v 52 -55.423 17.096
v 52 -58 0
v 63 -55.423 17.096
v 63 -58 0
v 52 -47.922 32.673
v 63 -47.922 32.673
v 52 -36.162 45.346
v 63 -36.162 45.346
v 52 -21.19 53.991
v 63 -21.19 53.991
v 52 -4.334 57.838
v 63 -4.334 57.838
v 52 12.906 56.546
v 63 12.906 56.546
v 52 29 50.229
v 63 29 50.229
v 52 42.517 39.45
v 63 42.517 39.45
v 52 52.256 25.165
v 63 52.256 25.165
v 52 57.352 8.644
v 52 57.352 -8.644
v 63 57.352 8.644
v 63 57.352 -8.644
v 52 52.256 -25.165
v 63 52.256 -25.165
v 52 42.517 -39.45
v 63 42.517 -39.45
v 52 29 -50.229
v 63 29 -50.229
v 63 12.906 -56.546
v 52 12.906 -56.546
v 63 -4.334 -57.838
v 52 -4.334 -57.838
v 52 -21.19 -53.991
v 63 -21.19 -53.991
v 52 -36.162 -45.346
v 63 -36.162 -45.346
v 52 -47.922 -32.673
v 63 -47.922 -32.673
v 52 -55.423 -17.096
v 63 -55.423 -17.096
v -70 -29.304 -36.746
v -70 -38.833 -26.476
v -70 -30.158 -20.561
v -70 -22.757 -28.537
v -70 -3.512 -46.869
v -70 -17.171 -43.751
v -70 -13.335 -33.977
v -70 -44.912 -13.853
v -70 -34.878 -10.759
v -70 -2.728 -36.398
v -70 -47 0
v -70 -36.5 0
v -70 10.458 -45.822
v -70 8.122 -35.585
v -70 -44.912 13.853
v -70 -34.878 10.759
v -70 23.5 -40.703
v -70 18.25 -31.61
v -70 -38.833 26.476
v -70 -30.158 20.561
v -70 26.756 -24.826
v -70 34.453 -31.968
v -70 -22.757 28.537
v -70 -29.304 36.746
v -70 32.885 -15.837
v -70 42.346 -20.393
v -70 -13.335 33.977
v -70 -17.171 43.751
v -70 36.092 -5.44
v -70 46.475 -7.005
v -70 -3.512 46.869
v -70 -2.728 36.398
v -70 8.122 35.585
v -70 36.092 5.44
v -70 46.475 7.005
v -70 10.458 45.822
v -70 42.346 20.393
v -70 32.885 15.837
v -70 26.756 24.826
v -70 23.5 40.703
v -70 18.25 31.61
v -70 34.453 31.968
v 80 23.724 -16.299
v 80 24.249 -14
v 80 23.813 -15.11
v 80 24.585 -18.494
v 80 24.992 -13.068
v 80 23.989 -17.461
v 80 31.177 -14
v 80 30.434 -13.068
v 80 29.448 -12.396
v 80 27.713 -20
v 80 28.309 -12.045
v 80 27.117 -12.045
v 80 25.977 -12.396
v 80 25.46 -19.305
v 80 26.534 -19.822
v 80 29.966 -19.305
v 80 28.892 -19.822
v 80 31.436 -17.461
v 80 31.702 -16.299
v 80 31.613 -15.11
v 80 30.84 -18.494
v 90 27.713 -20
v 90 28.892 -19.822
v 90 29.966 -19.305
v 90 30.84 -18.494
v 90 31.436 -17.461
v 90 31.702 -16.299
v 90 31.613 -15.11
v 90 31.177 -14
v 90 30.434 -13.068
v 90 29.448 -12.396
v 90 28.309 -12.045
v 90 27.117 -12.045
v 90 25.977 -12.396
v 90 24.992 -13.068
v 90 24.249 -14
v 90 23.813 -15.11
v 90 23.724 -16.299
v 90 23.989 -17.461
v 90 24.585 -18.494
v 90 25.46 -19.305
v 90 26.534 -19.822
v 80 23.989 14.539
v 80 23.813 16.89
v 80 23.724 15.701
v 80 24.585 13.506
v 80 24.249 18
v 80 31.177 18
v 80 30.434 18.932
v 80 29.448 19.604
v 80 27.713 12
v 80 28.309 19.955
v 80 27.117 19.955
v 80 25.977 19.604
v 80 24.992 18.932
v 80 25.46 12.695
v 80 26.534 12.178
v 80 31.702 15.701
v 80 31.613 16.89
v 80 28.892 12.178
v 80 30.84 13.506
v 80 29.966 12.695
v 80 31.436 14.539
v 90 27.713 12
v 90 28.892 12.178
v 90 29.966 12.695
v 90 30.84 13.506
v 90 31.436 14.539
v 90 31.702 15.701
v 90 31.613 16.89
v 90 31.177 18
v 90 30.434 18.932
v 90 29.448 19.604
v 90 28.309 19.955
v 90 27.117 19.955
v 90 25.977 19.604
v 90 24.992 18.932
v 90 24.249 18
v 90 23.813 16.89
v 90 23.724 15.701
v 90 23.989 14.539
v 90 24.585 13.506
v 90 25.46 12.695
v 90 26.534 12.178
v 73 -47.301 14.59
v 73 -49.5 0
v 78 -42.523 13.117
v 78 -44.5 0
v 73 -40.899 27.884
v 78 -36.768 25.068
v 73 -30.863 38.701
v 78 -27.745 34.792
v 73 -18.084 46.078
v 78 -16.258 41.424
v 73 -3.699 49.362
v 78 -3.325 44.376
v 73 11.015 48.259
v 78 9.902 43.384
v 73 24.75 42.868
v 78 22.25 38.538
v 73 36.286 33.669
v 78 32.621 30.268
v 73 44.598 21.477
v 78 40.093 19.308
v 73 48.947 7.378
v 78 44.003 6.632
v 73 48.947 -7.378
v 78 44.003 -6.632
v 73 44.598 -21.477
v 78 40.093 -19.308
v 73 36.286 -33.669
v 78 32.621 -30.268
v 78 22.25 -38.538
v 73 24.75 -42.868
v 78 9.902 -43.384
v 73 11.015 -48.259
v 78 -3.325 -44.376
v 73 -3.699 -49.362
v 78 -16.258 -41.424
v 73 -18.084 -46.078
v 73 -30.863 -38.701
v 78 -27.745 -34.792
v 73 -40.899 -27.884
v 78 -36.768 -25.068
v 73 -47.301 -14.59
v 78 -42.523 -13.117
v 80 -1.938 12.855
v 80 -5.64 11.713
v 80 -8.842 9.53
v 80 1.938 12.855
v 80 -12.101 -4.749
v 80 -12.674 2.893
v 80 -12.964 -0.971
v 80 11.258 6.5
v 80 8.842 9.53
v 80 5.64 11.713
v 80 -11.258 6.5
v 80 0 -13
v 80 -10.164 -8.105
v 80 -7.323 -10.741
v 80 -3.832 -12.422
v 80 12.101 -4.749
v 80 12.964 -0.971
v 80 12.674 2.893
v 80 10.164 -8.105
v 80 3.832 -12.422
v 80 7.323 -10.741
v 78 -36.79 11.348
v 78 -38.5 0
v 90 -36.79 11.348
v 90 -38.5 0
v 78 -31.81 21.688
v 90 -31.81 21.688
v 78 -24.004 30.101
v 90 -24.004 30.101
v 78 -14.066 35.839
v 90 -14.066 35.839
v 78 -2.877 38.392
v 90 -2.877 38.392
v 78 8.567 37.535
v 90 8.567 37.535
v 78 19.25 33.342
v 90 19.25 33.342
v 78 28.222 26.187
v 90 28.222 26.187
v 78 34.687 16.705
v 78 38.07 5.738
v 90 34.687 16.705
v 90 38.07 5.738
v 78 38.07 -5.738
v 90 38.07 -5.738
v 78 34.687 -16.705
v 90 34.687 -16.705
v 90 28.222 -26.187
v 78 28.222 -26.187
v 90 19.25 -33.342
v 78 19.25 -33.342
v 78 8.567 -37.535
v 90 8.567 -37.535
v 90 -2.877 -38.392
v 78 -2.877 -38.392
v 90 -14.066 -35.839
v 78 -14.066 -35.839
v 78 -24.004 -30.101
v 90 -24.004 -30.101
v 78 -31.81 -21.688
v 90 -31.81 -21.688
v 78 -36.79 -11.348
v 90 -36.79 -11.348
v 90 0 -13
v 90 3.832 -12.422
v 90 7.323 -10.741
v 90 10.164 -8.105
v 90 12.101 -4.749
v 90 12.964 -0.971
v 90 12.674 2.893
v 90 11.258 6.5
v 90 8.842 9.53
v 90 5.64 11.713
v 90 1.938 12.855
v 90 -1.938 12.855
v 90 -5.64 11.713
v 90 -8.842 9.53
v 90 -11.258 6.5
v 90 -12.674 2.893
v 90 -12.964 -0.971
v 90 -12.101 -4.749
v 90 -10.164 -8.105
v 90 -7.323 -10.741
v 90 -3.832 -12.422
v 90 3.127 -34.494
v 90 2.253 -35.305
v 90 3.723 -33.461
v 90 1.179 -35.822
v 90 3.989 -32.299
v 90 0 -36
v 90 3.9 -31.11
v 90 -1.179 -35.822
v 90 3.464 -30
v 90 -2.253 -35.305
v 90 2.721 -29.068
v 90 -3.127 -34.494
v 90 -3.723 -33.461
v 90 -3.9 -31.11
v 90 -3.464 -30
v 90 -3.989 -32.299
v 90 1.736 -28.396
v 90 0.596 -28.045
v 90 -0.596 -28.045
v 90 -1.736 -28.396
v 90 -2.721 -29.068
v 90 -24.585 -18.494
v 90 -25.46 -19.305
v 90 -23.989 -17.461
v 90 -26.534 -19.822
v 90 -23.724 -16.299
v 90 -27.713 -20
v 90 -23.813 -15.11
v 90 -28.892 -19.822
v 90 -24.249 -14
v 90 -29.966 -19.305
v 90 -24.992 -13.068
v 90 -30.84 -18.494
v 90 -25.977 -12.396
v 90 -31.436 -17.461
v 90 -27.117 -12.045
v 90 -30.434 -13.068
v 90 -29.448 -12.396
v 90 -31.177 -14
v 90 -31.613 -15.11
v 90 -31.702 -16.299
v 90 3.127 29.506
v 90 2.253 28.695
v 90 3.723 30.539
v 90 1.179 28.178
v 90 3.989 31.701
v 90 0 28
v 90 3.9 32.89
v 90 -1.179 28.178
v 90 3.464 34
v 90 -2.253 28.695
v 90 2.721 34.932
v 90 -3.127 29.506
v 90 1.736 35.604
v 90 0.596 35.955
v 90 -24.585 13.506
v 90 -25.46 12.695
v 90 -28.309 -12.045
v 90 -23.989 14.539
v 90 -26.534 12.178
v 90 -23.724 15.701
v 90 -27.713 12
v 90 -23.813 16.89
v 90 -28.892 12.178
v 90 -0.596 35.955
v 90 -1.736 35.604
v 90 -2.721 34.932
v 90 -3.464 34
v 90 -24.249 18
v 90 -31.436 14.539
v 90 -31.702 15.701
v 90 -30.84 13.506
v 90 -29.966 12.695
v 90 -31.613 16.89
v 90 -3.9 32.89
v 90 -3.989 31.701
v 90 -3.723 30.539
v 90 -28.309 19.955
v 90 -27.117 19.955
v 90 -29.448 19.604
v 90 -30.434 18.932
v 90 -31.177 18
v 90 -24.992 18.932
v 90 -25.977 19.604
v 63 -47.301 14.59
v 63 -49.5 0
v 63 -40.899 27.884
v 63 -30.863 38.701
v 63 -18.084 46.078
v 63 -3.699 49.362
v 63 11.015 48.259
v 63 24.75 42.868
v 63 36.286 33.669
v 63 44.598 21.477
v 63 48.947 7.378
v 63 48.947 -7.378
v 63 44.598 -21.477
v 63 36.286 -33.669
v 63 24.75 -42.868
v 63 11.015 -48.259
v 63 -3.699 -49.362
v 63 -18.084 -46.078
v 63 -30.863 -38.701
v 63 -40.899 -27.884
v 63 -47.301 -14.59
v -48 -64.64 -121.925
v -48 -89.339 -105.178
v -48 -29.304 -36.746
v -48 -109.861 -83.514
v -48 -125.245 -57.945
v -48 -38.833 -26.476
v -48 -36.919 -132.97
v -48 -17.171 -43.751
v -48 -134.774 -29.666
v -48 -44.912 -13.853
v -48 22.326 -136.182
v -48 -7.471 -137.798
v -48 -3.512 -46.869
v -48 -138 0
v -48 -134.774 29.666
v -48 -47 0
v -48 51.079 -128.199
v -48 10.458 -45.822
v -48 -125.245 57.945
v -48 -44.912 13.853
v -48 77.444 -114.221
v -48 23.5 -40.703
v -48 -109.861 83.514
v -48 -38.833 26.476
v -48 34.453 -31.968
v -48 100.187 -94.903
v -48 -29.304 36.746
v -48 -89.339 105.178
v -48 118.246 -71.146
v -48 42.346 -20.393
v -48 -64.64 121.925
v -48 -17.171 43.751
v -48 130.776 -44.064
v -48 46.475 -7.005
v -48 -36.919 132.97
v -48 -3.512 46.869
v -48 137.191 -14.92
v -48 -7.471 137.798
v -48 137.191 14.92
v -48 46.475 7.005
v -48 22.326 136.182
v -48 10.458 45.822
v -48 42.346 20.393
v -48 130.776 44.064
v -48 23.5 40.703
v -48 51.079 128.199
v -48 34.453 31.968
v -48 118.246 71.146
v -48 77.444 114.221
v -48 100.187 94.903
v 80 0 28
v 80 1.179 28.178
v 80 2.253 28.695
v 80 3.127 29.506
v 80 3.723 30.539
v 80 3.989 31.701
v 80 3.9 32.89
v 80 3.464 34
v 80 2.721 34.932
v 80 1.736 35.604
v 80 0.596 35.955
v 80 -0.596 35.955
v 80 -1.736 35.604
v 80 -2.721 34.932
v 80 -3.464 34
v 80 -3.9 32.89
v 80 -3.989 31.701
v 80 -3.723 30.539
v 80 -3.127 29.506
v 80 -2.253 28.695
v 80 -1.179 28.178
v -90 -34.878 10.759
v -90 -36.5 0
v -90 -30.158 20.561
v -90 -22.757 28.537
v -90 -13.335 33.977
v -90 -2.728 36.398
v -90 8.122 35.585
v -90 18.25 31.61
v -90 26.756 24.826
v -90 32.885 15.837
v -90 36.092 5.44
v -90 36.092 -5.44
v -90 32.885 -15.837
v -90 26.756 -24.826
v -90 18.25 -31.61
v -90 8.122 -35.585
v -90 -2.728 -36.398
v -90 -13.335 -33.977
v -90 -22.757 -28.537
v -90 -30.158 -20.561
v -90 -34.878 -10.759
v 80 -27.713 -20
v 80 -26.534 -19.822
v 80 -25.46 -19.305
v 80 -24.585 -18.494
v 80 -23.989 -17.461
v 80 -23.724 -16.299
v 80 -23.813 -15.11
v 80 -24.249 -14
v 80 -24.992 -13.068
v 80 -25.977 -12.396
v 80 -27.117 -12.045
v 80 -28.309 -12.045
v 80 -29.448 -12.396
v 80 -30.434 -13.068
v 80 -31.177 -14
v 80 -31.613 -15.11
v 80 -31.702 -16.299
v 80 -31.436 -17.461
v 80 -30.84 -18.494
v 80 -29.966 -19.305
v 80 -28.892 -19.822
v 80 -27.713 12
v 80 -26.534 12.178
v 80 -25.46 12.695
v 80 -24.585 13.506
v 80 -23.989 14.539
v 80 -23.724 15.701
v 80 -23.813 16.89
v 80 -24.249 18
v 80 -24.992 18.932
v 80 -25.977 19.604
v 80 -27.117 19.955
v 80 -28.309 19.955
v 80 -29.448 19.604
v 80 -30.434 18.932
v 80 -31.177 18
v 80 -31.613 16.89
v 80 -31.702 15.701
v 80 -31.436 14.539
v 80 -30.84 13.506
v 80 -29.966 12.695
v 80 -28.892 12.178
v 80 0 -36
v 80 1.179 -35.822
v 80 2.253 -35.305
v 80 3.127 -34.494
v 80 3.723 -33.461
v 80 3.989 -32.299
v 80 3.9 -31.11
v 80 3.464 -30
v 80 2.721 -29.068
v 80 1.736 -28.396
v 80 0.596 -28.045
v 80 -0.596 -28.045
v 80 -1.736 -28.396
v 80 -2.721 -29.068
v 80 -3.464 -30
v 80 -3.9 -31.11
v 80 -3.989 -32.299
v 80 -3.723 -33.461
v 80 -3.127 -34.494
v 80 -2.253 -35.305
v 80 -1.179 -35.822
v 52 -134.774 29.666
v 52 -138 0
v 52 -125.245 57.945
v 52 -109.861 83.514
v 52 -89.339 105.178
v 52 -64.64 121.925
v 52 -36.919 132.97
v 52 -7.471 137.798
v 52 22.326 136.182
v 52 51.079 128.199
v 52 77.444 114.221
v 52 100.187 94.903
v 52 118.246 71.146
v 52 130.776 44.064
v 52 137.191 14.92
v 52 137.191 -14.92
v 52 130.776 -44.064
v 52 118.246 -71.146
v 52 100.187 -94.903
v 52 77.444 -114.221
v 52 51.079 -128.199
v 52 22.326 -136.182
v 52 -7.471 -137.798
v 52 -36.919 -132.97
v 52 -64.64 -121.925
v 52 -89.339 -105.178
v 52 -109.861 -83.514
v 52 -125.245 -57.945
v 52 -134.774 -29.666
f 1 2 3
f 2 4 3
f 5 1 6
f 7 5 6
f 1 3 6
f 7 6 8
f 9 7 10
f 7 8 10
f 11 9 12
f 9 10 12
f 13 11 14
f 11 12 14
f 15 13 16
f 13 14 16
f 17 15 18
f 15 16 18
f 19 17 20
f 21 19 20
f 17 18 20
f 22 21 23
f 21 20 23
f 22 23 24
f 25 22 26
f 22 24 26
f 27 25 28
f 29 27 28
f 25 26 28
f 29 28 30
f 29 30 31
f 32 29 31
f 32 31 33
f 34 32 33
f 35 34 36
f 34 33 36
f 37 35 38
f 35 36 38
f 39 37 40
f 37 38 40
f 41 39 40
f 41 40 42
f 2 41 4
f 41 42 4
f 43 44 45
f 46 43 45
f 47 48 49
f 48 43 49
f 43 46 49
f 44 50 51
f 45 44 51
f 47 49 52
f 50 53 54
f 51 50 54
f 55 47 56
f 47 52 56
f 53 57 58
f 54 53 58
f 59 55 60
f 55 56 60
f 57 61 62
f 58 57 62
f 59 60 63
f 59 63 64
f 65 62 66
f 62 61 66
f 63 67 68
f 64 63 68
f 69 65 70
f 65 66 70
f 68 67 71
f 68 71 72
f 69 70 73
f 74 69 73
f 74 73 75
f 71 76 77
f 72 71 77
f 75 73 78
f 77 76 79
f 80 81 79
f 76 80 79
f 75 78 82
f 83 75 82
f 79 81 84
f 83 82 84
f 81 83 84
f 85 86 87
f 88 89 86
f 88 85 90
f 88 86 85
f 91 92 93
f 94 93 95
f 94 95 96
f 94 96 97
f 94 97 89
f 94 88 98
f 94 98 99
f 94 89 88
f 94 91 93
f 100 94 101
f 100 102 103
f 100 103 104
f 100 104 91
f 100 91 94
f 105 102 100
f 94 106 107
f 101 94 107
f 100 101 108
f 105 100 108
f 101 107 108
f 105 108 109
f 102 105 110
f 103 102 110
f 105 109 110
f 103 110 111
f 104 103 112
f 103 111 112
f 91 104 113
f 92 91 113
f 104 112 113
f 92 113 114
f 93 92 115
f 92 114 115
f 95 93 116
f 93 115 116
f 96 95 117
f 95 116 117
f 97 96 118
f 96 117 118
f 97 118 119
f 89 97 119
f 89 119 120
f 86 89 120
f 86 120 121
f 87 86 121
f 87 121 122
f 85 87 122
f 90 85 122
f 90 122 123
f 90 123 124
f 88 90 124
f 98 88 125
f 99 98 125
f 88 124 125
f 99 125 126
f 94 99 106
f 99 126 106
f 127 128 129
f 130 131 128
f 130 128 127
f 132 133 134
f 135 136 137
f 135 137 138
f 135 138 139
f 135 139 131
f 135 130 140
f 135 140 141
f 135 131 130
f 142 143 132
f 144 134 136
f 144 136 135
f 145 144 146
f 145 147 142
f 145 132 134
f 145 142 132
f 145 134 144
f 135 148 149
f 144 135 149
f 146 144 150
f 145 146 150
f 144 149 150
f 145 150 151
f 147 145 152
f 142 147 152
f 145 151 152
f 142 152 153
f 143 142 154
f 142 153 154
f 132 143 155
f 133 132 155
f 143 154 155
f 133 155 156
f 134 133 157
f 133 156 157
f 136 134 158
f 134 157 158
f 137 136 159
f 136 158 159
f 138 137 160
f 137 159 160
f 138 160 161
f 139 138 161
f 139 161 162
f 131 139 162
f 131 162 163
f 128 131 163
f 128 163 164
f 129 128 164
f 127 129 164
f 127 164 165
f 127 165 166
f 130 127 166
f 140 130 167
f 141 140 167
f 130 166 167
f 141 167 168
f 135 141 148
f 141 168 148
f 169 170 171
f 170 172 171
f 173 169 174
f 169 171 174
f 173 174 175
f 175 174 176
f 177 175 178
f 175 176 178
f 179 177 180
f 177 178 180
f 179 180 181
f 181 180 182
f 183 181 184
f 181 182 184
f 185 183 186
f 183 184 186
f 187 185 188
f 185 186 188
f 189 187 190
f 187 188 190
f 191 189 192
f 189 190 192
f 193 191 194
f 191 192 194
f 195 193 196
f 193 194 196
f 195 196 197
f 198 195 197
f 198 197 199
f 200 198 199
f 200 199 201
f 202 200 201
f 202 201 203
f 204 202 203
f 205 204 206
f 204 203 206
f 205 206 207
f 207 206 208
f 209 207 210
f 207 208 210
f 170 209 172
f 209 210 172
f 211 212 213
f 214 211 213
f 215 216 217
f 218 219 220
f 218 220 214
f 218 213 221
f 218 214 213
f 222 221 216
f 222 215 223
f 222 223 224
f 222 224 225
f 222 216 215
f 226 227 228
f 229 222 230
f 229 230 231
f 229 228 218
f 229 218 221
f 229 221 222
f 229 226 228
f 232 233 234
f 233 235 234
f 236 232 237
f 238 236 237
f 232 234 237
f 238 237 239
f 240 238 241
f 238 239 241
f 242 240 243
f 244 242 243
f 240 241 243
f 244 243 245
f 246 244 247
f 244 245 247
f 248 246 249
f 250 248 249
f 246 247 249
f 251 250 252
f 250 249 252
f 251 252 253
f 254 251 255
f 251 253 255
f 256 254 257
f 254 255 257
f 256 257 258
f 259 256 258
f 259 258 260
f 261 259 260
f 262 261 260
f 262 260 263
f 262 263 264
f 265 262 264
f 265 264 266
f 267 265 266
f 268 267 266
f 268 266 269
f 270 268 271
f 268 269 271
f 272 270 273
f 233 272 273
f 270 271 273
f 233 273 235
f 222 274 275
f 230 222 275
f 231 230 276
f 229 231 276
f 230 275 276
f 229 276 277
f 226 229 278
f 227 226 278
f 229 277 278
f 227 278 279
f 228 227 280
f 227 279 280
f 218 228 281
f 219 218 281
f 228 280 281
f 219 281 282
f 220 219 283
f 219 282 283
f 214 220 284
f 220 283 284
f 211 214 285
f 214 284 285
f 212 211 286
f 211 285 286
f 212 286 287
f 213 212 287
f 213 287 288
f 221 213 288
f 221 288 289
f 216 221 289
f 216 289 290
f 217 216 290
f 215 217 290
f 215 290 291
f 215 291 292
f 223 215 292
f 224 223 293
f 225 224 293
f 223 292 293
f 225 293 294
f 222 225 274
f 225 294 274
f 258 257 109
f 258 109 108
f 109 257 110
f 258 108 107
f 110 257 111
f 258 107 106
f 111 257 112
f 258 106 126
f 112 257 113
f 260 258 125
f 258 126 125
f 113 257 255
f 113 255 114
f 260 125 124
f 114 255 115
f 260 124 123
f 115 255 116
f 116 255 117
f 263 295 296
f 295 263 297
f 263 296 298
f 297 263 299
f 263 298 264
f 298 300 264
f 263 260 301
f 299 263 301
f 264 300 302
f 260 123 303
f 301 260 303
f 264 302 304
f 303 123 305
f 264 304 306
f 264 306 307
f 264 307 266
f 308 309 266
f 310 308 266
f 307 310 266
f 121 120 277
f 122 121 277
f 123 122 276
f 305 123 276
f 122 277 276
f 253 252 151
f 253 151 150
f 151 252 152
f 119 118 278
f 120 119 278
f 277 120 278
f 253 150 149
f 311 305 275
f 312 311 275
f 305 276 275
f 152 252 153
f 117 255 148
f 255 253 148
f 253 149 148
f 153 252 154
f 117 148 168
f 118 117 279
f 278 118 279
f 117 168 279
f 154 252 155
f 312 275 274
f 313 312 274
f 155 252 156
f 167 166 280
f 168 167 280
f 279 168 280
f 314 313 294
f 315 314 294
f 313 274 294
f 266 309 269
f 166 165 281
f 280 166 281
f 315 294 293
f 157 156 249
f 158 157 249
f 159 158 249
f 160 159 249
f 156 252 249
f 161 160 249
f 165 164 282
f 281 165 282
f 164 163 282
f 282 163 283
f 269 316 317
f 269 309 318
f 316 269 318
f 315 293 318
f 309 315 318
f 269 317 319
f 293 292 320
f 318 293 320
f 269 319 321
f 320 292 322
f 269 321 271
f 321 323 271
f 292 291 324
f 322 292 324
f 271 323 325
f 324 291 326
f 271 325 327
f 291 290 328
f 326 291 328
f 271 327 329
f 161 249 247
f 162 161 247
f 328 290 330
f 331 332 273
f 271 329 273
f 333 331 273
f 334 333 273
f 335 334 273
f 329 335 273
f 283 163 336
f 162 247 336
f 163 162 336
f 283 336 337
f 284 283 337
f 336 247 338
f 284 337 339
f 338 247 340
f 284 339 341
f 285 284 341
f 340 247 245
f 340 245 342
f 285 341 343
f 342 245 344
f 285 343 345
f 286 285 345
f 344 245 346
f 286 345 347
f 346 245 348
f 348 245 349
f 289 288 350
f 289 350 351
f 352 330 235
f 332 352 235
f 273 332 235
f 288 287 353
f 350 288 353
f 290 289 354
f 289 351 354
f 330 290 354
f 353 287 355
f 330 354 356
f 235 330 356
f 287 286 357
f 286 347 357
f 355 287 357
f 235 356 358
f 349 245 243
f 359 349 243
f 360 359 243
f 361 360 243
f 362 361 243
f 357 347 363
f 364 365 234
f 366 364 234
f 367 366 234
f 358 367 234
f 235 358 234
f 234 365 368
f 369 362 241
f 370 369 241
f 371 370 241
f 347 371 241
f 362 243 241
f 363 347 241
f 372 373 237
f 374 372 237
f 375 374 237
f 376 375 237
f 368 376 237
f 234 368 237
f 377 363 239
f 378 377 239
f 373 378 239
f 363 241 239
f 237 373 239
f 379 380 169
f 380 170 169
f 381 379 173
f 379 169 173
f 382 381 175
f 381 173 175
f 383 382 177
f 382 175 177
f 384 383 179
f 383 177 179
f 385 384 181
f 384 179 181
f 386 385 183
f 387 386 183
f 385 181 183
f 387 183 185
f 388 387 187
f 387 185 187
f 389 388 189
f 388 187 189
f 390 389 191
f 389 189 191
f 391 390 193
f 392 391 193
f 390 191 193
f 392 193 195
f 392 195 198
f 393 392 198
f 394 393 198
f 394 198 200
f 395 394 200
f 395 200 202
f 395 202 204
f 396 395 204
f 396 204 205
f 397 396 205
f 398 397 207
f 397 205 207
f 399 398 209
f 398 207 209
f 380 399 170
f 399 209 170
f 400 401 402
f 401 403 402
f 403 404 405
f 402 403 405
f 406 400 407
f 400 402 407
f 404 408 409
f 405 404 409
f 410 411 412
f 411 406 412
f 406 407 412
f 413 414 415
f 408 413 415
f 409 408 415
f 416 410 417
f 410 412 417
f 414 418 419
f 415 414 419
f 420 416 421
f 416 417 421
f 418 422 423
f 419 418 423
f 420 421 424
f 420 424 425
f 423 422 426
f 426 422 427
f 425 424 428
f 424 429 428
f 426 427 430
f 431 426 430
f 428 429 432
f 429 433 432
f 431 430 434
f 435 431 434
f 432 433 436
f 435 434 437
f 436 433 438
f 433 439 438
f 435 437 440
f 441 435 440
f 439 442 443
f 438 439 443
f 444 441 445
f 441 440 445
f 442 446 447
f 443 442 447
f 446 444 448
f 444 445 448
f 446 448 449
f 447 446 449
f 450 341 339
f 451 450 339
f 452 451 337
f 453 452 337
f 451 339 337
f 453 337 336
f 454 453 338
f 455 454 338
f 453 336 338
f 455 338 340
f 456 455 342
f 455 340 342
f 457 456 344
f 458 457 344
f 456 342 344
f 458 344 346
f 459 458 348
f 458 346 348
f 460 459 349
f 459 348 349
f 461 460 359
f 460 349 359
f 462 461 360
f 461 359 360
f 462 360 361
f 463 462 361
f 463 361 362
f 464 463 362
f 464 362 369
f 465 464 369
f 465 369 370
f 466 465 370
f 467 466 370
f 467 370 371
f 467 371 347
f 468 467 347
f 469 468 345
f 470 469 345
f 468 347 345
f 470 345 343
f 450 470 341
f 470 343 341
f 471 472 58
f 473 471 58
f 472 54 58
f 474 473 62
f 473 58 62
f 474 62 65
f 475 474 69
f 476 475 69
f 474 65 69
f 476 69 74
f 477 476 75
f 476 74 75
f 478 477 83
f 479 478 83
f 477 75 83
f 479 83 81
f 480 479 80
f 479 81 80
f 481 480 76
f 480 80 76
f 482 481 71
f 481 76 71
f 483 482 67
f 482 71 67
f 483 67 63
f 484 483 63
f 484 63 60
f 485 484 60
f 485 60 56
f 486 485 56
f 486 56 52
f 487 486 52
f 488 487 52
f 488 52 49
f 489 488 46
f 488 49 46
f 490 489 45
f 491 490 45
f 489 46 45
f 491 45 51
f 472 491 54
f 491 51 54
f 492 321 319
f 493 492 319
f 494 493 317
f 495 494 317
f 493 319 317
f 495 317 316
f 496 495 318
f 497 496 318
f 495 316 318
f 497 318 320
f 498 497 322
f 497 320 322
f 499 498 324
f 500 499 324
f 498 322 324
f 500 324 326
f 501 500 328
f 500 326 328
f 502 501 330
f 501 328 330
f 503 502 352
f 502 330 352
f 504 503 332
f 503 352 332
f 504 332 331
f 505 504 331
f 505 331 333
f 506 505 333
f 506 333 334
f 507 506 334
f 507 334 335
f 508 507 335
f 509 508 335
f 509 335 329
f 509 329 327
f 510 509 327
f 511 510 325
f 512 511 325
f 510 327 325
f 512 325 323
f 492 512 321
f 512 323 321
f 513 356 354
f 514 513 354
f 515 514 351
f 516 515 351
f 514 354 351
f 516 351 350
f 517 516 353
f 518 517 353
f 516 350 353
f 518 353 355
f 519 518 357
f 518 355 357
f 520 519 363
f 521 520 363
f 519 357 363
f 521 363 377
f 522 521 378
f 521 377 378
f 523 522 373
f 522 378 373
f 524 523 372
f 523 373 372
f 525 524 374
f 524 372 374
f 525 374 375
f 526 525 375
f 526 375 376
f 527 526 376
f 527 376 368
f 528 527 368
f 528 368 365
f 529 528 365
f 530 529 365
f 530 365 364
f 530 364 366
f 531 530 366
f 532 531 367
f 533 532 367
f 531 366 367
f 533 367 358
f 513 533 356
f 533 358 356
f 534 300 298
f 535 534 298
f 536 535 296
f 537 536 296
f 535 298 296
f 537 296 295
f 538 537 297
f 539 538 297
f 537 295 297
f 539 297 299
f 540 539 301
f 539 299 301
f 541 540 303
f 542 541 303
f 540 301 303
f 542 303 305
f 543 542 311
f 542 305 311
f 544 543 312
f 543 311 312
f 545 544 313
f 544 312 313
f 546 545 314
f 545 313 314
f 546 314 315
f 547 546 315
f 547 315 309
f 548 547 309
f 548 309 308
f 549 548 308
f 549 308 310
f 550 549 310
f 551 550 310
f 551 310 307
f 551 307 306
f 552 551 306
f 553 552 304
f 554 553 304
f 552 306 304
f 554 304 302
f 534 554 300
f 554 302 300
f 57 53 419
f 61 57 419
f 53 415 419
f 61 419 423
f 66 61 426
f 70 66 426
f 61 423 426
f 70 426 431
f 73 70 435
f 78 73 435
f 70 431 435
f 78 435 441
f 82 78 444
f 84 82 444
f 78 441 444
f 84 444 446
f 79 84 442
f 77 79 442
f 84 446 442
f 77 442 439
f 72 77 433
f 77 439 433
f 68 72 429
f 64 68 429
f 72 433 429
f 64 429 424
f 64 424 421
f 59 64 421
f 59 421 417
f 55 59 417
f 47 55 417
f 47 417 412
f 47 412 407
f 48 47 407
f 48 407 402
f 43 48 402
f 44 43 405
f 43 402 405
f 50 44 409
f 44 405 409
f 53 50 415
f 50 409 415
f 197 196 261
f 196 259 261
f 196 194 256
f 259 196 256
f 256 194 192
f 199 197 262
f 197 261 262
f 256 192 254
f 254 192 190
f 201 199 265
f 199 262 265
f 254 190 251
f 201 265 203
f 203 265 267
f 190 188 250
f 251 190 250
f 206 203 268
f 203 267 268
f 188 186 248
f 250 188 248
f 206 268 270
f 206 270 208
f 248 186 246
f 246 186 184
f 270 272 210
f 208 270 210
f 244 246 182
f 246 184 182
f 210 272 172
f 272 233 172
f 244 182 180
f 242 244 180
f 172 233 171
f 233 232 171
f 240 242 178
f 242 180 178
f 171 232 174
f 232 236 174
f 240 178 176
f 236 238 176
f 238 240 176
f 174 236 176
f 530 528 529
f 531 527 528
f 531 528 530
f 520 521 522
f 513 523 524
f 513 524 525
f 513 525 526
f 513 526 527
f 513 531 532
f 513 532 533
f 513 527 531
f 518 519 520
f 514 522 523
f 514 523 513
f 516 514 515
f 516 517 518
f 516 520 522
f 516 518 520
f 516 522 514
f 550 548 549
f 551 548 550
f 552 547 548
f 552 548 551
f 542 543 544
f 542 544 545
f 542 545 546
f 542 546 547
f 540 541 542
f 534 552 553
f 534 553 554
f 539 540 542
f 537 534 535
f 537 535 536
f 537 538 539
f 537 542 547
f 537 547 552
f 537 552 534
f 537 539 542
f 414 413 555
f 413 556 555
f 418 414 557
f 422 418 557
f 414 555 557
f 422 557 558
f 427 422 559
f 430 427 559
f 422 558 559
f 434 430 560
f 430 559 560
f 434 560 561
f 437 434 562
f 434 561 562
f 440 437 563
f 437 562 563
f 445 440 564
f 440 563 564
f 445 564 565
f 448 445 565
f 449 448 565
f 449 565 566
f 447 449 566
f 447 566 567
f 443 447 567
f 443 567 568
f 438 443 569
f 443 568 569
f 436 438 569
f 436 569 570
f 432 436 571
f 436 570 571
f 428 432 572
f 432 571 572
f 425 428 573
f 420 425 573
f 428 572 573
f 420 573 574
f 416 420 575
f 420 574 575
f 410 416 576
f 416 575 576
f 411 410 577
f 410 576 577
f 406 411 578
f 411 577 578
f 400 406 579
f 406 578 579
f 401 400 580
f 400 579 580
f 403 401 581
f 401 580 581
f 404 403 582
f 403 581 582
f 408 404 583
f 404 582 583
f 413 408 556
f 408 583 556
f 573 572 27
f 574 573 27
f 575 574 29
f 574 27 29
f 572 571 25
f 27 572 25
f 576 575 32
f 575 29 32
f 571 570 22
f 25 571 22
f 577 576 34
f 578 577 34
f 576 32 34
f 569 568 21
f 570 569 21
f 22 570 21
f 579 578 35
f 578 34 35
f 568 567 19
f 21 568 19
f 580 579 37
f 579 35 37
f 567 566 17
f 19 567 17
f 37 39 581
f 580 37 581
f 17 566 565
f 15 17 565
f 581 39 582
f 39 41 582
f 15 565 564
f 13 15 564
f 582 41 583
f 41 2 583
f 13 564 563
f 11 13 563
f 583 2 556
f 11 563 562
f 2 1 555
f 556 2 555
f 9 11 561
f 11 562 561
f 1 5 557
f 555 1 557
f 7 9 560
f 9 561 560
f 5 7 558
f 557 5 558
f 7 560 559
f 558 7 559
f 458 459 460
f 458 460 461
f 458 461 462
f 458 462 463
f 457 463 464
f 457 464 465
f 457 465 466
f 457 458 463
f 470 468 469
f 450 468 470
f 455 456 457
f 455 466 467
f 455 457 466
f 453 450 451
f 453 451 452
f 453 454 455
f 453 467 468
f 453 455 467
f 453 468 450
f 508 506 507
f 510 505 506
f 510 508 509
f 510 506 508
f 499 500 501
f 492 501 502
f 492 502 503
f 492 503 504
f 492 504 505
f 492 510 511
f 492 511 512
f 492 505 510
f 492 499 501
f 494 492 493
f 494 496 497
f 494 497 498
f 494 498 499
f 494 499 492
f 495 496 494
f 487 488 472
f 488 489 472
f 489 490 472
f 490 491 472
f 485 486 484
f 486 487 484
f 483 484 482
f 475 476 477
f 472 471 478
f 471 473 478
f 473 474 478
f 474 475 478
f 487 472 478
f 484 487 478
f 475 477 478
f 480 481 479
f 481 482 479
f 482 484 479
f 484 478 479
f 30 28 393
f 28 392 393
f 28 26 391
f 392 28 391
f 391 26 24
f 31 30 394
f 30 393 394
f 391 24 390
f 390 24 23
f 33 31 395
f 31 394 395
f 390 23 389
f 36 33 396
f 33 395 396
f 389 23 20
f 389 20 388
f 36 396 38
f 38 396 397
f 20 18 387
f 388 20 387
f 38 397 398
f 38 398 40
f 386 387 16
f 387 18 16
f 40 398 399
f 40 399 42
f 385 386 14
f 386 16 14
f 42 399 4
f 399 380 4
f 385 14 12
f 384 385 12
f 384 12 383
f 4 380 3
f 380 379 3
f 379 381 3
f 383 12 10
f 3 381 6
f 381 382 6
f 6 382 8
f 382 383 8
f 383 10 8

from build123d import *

# Parameters (mm, degrees)
SZKIC4_R                   = 4
WYTNIJ_WYCI_GNI_CIE1_DEPTH = 10
SZKIC5_R                   = 13
WYTNIJ_WYCI_GNI_CIE2_DEPTH = 10


with BuildPart() as part:
    # Szkic1 → Obrót1 (revolve)
    with BuildSketch(Plane.XY):
        Polygon((-90, -36.5), (-70, -36.5), (-70, -47), (-48, -47), (-48, -138), (52, -138), (52, -58), (63, -58), (63, -49.5), (73, -49.5), (78, -44.5), (78, -38.5), (90, -38.5), (90, 0), (-90, 0), align=None)
    revolve(axis=Axis((90, 0, 0), (-1, 0, 0)))

    # Szkic4 → Wytnij-wyciągnięcie1 (cut)
    with BuildSketch(Plane(origin=(90, 0, 0), x_dir=(0, 0, -1), z_dir=(1, 0, 0))):
        with Locations((16, 27.712812921)):
            Circle(SZKIC4_R)
        with Locations((32, 0)):
            Circle(SZKIC4_R)
        with Locations((16, -27.712812921)):
            Circle(SZKIC4_R)
        with Locations((-16, -27.712812921)):
            Circle(SZKIC4_R)
        with Locations((-32, 0)):
            Circle(SZKIC4_R)
        with Locations((-16, 27.712812921)):
            Circle(SZKIC4_R)
    extrude(amount=-WYTNIJ_WYCI_GNI_CIE1_DEPTH, mode=Mode.SUBTRACT)

    # Szkic5 → Wytnij-wyciągnięcie2 (cut)
    with BuildSketch(Plane(origin=(90, 0, 0), x_dir=(0, 0, -1), z_dir=(1, 0, 0))):
        Circle(SZKIC5_R)
    extrude(amount=-WYTNIJ_WYCI_GNI_CIE2_DEPTH, mode=Mode.SUBTRACT)


solid = part.part
